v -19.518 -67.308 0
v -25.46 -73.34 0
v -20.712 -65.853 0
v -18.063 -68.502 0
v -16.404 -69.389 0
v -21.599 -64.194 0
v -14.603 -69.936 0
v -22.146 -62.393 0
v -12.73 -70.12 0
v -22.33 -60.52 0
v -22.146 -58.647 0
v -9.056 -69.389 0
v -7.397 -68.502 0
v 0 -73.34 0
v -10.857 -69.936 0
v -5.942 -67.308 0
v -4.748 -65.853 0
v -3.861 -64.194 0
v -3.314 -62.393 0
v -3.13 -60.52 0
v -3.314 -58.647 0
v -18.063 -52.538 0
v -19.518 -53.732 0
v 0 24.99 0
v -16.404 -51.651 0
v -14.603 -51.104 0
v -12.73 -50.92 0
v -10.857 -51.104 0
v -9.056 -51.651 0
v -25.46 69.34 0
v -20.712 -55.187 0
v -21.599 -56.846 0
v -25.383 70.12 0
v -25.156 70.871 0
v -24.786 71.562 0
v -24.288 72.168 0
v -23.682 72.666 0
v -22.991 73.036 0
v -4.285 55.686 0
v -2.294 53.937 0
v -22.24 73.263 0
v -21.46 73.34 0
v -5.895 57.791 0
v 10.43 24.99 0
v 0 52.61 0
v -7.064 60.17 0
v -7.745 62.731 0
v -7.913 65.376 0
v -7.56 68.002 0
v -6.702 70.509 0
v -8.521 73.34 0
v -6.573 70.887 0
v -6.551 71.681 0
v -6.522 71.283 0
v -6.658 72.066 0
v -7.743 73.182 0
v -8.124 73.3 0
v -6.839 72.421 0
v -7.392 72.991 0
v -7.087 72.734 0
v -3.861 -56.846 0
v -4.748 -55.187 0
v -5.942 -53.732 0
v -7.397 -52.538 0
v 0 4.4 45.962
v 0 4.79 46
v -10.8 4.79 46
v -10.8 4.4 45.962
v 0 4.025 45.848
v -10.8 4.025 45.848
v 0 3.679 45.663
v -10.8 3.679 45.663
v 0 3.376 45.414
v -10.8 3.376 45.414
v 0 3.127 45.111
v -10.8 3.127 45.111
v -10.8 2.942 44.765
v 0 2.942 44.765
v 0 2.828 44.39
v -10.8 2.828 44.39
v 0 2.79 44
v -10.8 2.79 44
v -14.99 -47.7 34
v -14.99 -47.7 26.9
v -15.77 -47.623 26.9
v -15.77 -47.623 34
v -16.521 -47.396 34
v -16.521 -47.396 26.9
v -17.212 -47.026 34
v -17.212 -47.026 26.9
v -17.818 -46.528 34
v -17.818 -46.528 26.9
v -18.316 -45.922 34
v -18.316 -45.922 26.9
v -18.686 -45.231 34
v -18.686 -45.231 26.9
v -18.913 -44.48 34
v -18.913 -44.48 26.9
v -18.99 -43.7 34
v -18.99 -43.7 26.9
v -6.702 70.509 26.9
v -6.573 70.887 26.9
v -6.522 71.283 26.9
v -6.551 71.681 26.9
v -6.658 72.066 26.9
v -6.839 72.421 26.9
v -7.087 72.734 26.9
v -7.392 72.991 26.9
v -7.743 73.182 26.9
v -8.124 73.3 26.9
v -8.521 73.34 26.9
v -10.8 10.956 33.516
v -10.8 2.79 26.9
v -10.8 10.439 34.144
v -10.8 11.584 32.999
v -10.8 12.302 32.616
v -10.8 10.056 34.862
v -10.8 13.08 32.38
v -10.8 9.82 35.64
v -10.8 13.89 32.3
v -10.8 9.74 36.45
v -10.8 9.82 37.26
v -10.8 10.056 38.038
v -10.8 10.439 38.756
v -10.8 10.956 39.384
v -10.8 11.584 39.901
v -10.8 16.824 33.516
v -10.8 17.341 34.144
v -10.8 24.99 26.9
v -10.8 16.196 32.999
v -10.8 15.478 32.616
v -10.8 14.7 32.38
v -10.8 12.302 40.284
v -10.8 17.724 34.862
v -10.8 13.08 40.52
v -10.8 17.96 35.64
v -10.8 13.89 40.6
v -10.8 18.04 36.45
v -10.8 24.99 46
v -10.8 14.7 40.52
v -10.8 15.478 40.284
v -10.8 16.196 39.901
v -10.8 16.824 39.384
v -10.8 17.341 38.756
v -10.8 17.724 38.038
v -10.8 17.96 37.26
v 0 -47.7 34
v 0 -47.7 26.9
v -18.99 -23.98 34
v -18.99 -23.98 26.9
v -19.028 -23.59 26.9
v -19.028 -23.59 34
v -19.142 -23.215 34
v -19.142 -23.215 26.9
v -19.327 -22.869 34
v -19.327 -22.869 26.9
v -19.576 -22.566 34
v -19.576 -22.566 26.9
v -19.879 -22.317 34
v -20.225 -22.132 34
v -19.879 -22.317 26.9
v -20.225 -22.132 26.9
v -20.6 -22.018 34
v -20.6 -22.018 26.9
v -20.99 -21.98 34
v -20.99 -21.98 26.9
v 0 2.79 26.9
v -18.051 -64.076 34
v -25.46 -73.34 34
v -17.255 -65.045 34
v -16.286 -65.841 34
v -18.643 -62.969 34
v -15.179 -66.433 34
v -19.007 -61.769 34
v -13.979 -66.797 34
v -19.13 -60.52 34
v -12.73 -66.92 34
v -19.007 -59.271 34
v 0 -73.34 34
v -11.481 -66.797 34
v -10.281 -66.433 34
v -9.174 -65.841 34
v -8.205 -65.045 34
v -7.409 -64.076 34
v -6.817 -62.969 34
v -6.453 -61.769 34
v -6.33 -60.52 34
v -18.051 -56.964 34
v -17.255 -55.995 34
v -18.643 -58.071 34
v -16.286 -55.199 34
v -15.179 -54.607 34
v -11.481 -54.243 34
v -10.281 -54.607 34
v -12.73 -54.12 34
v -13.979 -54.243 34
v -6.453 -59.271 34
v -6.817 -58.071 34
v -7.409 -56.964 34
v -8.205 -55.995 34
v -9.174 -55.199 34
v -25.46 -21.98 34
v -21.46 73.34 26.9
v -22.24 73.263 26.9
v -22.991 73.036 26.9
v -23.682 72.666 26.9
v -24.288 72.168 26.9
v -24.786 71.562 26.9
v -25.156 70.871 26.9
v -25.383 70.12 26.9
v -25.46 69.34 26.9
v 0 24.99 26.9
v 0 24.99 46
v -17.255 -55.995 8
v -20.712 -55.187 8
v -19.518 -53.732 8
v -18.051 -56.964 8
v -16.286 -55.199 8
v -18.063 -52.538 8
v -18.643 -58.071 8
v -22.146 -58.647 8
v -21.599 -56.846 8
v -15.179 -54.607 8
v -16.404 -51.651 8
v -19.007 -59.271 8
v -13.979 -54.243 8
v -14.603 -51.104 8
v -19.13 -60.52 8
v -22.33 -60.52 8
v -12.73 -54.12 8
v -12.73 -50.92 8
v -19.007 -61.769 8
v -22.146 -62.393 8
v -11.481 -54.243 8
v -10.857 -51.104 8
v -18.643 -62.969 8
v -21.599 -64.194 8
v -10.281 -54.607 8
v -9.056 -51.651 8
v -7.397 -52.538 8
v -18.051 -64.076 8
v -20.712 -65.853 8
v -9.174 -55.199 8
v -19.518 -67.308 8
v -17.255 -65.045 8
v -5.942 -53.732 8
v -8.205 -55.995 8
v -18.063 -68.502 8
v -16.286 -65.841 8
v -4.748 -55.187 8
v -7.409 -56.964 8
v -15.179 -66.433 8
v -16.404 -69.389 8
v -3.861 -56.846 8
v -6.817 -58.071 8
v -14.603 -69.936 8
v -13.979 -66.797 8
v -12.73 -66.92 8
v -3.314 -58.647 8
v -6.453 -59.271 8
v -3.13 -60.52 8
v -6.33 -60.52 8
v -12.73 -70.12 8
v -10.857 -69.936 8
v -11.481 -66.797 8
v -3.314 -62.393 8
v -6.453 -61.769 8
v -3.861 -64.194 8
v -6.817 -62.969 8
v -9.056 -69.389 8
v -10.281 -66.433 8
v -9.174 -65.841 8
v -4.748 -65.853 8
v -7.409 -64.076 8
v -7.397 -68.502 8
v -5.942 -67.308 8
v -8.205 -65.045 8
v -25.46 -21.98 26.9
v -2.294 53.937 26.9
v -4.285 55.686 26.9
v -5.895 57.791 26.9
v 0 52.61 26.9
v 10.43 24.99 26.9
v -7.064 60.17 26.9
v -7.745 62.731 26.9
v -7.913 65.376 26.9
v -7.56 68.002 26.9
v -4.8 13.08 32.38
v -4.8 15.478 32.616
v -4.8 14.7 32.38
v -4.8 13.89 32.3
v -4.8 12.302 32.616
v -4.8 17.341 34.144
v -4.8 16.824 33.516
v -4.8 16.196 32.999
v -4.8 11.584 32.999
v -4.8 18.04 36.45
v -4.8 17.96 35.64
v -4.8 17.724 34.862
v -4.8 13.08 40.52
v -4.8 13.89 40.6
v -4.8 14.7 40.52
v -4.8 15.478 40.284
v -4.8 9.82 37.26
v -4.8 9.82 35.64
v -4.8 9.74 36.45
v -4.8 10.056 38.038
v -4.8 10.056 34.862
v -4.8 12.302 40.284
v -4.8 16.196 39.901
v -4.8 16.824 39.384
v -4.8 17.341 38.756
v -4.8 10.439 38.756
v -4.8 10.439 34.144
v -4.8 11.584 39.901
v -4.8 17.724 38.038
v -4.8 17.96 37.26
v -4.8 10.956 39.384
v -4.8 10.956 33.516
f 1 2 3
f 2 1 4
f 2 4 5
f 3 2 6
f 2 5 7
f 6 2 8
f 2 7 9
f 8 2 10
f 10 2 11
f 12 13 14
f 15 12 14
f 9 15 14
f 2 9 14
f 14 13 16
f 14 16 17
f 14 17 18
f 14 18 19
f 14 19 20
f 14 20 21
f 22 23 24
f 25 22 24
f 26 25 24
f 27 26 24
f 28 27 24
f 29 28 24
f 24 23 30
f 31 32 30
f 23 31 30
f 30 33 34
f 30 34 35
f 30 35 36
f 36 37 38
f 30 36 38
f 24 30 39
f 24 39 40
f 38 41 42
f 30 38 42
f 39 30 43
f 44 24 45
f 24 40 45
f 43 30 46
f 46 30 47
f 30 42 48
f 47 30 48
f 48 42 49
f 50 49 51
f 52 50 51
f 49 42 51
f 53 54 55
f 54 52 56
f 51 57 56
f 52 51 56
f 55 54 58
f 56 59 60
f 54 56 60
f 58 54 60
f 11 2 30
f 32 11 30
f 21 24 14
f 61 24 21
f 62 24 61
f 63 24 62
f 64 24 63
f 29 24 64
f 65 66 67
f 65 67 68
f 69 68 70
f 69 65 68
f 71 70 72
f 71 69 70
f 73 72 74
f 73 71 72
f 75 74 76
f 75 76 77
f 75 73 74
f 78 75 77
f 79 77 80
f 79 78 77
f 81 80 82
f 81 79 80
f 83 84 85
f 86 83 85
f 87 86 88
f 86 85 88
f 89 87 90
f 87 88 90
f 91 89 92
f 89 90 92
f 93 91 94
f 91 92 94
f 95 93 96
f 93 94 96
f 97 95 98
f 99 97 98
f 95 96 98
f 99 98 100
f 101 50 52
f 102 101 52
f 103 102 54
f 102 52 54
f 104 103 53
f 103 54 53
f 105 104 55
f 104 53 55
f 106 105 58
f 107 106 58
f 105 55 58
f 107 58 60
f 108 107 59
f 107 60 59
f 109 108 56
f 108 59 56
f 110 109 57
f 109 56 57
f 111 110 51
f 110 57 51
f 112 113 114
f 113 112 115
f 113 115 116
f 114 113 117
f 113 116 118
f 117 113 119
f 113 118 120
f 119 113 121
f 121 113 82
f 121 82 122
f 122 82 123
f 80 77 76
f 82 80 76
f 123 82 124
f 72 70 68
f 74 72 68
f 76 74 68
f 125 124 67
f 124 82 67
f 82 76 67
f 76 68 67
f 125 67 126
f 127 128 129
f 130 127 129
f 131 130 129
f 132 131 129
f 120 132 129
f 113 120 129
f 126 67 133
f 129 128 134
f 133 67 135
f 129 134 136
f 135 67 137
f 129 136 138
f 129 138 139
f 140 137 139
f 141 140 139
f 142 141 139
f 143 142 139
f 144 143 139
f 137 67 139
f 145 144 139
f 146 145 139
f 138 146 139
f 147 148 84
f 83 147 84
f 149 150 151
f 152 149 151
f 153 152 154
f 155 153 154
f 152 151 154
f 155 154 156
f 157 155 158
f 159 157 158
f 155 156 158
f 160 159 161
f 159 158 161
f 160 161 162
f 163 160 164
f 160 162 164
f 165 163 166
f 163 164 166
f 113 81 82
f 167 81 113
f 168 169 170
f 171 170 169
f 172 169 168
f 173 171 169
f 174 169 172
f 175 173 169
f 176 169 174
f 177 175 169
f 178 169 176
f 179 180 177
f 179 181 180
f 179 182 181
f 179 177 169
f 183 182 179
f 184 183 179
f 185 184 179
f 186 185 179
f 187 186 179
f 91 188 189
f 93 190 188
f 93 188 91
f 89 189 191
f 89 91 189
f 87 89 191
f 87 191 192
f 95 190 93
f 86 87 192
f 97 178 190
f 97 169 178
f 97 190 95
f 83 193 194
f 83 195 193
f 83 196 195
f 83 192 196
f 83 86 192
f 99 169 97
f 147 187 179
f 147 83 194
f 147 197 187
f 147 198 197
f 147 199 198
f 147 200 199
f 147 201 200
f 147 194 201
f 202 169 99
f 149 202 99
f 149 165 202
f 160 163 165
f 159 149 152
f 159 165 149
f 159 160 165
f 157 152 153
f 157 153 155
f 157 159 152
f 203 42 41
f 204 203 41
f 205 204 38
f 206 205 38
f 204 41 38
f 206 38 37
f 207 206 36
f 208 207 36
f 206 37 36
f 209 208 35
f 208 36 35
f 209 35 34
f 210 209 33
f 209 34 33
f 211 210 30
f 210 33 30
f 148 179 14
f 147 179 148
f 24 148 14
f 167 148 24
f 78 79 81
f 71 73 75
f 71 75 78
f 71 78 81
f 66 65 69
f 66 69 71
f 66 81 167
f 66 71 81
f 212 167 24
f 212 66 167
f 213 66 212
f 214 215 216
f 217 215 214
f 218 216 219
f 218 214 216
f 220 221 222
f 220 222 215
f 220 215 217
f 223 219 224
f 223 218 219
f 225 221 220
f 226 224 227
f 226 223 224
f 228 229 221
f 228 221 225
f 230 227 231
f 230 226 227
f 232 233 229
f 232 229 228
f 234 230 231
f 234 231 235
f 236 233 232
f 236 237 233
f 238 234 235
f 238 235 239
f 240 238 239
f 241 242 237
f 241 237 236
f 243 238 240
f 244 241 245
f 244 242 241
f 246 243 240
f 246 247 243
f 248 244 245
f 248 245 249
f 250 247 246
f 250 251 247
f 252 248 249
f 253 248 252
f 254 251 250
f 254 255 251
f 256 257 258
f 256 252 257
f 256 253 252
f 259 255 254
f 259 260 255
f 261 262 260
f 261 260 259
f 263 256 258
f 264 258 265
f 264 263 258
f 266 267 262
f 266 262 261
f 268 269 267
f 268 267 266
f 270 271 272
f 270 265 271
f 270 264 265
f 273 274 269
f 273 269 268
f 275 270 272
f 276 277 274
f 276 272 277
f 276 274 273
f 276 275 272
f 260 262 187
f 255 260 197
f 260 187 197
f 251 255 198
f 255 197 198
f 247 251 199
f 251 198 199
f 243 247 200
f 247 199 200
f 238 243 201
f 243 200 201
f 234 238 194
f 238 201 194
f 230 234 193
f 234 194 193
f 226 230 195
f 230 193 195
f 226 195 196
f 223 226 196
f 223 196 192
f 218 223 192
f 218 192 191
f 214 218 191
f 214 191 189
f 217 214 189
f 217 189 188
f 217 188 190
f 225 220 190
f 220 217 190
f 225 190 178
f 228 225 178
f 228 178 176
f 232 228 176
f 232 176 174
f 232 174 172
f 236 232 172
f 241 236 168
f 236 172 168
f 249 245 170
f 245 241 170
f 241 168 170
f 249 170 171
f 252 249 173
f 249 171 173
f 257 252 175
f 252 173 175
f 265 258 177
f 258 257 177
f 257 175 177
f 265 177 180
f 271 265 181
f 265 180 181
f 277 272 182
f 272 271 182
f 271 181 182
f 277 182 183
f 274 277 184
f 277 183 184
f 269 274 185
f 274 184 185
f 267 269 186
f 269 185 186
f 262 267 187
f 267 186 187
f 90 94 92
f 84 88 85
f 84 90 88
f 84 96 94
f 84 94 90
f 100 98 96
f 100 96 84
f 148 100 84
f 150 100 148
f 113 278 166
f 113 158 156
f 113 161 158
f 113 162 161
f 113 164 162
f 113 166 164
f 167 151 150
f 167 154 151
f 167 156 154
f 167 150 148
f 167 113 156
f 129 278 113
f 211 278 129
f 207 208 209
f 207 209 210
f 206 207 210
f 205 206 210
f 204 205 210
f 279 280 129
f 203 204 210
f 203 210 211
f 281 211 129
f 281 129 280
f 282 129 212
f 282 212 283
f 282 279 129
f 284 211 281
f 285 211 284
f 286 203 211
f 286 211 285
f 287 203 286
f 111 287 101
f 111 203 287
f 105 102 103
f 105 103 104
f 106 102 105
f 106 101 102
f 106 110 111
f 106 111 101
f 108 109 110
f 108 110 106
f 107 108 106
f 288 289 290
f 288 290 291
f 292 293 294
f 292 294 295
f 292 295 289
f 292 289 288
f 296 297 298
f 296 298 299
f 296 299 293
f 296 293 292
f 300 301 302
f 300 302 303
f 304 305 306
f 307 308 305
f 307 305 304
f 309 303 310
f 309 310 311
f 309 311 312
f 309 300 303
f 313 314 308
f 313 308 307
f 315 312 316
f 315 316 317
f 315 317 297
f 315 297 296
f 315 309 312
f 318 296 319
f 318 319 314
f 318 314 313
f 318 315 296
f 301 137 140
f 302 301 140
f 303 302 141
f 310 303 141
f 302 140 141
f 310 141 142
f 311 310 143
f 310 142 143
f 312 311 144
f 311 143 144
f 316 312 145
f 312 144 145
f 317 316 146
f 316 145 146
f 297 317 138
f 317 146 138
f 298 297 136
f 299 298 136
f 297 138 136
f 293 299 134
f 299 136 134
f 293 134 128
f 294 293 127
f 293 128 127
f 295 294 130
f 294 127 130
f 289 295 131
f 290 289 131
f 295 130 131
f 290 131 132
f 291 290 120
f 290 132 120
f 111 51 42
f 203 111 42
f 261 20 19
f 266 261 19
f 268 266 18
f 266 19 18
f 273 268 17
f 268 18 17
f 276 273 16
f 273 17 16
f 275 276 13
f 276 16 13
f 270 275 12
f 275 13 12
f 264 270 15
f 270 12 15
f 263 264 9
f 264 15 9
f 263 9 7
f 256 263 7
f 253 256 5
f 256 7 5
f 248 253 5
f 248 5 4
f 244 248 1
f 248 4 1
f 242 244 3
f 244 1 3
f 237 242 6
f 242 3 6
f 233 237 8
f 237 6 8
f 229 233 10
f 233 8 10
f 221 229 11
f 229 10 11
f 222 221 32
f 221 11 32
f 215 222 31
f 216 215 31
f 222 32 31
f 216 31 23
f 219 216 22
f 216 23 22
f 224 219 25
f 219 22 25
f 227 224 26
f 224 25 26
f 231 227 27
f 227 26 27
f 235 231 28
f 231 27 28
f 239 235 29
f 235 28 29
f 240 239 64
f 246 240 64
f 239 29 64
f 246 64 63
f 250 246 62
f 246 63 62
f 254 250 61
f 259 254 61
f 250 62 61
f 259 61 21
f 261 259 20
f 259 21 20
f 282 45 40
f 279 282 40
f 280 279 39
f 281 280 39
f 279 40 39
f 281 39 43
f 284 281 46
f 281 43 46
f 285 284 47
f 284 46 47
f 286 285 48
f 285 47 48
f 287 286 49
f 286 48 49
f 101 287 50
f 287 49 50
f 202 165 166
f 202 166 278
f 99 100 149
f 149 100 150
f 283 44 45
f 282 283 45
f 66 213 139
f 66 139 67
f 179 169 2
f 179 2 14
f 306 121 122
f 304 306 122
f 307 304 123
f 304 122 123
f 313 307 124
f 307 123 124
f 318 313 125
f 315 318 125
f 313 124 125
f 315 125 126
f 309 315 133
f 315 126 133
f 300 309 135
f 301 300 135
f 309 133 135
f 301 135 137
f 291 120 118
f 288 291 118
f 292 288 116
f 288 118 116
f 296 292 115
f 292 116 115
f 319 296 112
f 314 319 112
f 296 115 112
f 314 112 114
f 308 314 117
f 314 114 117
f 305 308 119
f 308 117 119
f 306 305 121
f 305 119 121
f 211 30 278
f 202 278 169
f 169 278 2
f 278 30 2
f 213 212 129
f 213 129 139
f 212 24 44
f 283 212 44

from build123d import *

# Parameters (mm, degrees)
F1_DEPTH  = 26.9
F3_DEPTH  = 7.1
F5_DEPTH  = 10.8
F7_DEPTH  = 6
F8_R      = 6.4
F9_DEPTH  = 34.001
F10_R     = 9.6
F10_R_2   = 6.4
F11_DEPTH = 8


with BuildPart() as f1:
    # F0 (on Top) → F1 (new body)
    with BuildSketch(Plane.XY):
        Polygon((10.43, 24.99), (0, 52.61), (0, 24.99), align=None)
        with BuildLine():
            Line((-8.521254, 73.34), (-21.46, 73.34))
            ThreePointArc((-21.46, 73.34), (-24.288427, 72.168427), (-25.46, 69.34))
            Line((-25.46, 69.34), (-25.46, -73.34))
            Line((-25.46, -73.34), (0, -73.34))
            Line((0, -73.34), (0, 24.99))
            Line((0, 24.99), (0, 52.61))
            ThreePointArc((0, 52.61), (-7.063822, 60.169557), (-6.701861, 70.509453))
            ThreePointArc((-6.701861, 70.509453), (-6.838831, 72.421413), (-8.521254, 73.34))
        make_face()
    extrude(amount=F1_DEPTH)

    # F2 (on face) → F3 (join)
    with BuildSketch(Plane.XY.offset(26.9)):
        with BuildLine():
            Line((-25.46, -73.34), (0, -73.34))
            Line((0, -73.34), (0, -47.7))
            Line((0, -47.7), (-14.99, -47.7))
            ThreePointArc((-14.99, -47.7), (-17.818427, -46.528427), (-18.99, -43.7))
            Line((-18.99, -43.7), (-18.99, -23.98))
            ThreePointArc((-18.99, -23.98), (-19.575786, -22.565786), (-20.99, -21.98))
            Line((-20.99, -21.98), (-25.46, -21.98))
            Line((-25.46, -21.98), (-25.46, -73.34))
        make_face()
    extrude(amount=F3_DEPTH)

    # F4 (on face) → F5 (join)
    with BuildSketch(Plane.YZ):
        with BuildLine():
            Line((2.79, 26.9), (24.99, 26.9))
            Line((24.99, 26.9), (24.99, 46))
            Line((24.99, 46), (4.79, 46))
            ThreePointArc((4.79, 46), (3.375786, 45.414214), (2.79, 44))
            Line((2.79, 44), (2.79, 26.9))
        make_face()
    extrude(amount=-F5_DEPTH)

    # F6 (on face) → F7 (cut)
    with BuildSketch(Plane(origin=(-10.8, 0, 0), x_dir=(0, -1, 0), z_dir=(-1, 0, 0))):
        with BuildLine():
            ThreePointArc((-13.89, 32.3), (-10.955507, 33.515507), (-9.74, 36.45))
            ThreePointArc((-9.74, 36.45), (-10.955507, 39.384493), (-13.89, 40.6))
            Line((-13.89, 40.6), (-13.89, 32.3))
        make_face()
        with BuildLine():
            Line((-13.89, 32.3), (-13.89, 40.6))
            ThreePointArc((-13.89, 40.6), (-18.04, 36.45), (-13.89, 32.3))
        make_face()
    extrude(amount=-F7_DEPTH, mode=Mode.SUBTRACT)

    # F8 (on face) → F9 (cut, through all)
    with BuildSketch(Plane.XY.offset(34)):
        with Locations((-12.73, -60.52)):
            Circle(F8_R)
    extrude(amount=-F9_DEPTH, mode=Mode.SUBTRACT)

    # F10 (on face) → F11 (cut)
    with BuildSketch(Plane(origin=(0, 0, 0), x_dir=(1, 0, 0), z_dir=(0, 0, -1))):
        with Locations((-12.73, 60.52)):
            Circle(F10_R)
        with Locations((-12.73, 60.52)):
            Circle(F10_R_2, mode=Mode.SUBTRACT)
    extrude(amount=-F11_DEPTH, mode=Mode.SUBTRACT)


solid = f1.part
